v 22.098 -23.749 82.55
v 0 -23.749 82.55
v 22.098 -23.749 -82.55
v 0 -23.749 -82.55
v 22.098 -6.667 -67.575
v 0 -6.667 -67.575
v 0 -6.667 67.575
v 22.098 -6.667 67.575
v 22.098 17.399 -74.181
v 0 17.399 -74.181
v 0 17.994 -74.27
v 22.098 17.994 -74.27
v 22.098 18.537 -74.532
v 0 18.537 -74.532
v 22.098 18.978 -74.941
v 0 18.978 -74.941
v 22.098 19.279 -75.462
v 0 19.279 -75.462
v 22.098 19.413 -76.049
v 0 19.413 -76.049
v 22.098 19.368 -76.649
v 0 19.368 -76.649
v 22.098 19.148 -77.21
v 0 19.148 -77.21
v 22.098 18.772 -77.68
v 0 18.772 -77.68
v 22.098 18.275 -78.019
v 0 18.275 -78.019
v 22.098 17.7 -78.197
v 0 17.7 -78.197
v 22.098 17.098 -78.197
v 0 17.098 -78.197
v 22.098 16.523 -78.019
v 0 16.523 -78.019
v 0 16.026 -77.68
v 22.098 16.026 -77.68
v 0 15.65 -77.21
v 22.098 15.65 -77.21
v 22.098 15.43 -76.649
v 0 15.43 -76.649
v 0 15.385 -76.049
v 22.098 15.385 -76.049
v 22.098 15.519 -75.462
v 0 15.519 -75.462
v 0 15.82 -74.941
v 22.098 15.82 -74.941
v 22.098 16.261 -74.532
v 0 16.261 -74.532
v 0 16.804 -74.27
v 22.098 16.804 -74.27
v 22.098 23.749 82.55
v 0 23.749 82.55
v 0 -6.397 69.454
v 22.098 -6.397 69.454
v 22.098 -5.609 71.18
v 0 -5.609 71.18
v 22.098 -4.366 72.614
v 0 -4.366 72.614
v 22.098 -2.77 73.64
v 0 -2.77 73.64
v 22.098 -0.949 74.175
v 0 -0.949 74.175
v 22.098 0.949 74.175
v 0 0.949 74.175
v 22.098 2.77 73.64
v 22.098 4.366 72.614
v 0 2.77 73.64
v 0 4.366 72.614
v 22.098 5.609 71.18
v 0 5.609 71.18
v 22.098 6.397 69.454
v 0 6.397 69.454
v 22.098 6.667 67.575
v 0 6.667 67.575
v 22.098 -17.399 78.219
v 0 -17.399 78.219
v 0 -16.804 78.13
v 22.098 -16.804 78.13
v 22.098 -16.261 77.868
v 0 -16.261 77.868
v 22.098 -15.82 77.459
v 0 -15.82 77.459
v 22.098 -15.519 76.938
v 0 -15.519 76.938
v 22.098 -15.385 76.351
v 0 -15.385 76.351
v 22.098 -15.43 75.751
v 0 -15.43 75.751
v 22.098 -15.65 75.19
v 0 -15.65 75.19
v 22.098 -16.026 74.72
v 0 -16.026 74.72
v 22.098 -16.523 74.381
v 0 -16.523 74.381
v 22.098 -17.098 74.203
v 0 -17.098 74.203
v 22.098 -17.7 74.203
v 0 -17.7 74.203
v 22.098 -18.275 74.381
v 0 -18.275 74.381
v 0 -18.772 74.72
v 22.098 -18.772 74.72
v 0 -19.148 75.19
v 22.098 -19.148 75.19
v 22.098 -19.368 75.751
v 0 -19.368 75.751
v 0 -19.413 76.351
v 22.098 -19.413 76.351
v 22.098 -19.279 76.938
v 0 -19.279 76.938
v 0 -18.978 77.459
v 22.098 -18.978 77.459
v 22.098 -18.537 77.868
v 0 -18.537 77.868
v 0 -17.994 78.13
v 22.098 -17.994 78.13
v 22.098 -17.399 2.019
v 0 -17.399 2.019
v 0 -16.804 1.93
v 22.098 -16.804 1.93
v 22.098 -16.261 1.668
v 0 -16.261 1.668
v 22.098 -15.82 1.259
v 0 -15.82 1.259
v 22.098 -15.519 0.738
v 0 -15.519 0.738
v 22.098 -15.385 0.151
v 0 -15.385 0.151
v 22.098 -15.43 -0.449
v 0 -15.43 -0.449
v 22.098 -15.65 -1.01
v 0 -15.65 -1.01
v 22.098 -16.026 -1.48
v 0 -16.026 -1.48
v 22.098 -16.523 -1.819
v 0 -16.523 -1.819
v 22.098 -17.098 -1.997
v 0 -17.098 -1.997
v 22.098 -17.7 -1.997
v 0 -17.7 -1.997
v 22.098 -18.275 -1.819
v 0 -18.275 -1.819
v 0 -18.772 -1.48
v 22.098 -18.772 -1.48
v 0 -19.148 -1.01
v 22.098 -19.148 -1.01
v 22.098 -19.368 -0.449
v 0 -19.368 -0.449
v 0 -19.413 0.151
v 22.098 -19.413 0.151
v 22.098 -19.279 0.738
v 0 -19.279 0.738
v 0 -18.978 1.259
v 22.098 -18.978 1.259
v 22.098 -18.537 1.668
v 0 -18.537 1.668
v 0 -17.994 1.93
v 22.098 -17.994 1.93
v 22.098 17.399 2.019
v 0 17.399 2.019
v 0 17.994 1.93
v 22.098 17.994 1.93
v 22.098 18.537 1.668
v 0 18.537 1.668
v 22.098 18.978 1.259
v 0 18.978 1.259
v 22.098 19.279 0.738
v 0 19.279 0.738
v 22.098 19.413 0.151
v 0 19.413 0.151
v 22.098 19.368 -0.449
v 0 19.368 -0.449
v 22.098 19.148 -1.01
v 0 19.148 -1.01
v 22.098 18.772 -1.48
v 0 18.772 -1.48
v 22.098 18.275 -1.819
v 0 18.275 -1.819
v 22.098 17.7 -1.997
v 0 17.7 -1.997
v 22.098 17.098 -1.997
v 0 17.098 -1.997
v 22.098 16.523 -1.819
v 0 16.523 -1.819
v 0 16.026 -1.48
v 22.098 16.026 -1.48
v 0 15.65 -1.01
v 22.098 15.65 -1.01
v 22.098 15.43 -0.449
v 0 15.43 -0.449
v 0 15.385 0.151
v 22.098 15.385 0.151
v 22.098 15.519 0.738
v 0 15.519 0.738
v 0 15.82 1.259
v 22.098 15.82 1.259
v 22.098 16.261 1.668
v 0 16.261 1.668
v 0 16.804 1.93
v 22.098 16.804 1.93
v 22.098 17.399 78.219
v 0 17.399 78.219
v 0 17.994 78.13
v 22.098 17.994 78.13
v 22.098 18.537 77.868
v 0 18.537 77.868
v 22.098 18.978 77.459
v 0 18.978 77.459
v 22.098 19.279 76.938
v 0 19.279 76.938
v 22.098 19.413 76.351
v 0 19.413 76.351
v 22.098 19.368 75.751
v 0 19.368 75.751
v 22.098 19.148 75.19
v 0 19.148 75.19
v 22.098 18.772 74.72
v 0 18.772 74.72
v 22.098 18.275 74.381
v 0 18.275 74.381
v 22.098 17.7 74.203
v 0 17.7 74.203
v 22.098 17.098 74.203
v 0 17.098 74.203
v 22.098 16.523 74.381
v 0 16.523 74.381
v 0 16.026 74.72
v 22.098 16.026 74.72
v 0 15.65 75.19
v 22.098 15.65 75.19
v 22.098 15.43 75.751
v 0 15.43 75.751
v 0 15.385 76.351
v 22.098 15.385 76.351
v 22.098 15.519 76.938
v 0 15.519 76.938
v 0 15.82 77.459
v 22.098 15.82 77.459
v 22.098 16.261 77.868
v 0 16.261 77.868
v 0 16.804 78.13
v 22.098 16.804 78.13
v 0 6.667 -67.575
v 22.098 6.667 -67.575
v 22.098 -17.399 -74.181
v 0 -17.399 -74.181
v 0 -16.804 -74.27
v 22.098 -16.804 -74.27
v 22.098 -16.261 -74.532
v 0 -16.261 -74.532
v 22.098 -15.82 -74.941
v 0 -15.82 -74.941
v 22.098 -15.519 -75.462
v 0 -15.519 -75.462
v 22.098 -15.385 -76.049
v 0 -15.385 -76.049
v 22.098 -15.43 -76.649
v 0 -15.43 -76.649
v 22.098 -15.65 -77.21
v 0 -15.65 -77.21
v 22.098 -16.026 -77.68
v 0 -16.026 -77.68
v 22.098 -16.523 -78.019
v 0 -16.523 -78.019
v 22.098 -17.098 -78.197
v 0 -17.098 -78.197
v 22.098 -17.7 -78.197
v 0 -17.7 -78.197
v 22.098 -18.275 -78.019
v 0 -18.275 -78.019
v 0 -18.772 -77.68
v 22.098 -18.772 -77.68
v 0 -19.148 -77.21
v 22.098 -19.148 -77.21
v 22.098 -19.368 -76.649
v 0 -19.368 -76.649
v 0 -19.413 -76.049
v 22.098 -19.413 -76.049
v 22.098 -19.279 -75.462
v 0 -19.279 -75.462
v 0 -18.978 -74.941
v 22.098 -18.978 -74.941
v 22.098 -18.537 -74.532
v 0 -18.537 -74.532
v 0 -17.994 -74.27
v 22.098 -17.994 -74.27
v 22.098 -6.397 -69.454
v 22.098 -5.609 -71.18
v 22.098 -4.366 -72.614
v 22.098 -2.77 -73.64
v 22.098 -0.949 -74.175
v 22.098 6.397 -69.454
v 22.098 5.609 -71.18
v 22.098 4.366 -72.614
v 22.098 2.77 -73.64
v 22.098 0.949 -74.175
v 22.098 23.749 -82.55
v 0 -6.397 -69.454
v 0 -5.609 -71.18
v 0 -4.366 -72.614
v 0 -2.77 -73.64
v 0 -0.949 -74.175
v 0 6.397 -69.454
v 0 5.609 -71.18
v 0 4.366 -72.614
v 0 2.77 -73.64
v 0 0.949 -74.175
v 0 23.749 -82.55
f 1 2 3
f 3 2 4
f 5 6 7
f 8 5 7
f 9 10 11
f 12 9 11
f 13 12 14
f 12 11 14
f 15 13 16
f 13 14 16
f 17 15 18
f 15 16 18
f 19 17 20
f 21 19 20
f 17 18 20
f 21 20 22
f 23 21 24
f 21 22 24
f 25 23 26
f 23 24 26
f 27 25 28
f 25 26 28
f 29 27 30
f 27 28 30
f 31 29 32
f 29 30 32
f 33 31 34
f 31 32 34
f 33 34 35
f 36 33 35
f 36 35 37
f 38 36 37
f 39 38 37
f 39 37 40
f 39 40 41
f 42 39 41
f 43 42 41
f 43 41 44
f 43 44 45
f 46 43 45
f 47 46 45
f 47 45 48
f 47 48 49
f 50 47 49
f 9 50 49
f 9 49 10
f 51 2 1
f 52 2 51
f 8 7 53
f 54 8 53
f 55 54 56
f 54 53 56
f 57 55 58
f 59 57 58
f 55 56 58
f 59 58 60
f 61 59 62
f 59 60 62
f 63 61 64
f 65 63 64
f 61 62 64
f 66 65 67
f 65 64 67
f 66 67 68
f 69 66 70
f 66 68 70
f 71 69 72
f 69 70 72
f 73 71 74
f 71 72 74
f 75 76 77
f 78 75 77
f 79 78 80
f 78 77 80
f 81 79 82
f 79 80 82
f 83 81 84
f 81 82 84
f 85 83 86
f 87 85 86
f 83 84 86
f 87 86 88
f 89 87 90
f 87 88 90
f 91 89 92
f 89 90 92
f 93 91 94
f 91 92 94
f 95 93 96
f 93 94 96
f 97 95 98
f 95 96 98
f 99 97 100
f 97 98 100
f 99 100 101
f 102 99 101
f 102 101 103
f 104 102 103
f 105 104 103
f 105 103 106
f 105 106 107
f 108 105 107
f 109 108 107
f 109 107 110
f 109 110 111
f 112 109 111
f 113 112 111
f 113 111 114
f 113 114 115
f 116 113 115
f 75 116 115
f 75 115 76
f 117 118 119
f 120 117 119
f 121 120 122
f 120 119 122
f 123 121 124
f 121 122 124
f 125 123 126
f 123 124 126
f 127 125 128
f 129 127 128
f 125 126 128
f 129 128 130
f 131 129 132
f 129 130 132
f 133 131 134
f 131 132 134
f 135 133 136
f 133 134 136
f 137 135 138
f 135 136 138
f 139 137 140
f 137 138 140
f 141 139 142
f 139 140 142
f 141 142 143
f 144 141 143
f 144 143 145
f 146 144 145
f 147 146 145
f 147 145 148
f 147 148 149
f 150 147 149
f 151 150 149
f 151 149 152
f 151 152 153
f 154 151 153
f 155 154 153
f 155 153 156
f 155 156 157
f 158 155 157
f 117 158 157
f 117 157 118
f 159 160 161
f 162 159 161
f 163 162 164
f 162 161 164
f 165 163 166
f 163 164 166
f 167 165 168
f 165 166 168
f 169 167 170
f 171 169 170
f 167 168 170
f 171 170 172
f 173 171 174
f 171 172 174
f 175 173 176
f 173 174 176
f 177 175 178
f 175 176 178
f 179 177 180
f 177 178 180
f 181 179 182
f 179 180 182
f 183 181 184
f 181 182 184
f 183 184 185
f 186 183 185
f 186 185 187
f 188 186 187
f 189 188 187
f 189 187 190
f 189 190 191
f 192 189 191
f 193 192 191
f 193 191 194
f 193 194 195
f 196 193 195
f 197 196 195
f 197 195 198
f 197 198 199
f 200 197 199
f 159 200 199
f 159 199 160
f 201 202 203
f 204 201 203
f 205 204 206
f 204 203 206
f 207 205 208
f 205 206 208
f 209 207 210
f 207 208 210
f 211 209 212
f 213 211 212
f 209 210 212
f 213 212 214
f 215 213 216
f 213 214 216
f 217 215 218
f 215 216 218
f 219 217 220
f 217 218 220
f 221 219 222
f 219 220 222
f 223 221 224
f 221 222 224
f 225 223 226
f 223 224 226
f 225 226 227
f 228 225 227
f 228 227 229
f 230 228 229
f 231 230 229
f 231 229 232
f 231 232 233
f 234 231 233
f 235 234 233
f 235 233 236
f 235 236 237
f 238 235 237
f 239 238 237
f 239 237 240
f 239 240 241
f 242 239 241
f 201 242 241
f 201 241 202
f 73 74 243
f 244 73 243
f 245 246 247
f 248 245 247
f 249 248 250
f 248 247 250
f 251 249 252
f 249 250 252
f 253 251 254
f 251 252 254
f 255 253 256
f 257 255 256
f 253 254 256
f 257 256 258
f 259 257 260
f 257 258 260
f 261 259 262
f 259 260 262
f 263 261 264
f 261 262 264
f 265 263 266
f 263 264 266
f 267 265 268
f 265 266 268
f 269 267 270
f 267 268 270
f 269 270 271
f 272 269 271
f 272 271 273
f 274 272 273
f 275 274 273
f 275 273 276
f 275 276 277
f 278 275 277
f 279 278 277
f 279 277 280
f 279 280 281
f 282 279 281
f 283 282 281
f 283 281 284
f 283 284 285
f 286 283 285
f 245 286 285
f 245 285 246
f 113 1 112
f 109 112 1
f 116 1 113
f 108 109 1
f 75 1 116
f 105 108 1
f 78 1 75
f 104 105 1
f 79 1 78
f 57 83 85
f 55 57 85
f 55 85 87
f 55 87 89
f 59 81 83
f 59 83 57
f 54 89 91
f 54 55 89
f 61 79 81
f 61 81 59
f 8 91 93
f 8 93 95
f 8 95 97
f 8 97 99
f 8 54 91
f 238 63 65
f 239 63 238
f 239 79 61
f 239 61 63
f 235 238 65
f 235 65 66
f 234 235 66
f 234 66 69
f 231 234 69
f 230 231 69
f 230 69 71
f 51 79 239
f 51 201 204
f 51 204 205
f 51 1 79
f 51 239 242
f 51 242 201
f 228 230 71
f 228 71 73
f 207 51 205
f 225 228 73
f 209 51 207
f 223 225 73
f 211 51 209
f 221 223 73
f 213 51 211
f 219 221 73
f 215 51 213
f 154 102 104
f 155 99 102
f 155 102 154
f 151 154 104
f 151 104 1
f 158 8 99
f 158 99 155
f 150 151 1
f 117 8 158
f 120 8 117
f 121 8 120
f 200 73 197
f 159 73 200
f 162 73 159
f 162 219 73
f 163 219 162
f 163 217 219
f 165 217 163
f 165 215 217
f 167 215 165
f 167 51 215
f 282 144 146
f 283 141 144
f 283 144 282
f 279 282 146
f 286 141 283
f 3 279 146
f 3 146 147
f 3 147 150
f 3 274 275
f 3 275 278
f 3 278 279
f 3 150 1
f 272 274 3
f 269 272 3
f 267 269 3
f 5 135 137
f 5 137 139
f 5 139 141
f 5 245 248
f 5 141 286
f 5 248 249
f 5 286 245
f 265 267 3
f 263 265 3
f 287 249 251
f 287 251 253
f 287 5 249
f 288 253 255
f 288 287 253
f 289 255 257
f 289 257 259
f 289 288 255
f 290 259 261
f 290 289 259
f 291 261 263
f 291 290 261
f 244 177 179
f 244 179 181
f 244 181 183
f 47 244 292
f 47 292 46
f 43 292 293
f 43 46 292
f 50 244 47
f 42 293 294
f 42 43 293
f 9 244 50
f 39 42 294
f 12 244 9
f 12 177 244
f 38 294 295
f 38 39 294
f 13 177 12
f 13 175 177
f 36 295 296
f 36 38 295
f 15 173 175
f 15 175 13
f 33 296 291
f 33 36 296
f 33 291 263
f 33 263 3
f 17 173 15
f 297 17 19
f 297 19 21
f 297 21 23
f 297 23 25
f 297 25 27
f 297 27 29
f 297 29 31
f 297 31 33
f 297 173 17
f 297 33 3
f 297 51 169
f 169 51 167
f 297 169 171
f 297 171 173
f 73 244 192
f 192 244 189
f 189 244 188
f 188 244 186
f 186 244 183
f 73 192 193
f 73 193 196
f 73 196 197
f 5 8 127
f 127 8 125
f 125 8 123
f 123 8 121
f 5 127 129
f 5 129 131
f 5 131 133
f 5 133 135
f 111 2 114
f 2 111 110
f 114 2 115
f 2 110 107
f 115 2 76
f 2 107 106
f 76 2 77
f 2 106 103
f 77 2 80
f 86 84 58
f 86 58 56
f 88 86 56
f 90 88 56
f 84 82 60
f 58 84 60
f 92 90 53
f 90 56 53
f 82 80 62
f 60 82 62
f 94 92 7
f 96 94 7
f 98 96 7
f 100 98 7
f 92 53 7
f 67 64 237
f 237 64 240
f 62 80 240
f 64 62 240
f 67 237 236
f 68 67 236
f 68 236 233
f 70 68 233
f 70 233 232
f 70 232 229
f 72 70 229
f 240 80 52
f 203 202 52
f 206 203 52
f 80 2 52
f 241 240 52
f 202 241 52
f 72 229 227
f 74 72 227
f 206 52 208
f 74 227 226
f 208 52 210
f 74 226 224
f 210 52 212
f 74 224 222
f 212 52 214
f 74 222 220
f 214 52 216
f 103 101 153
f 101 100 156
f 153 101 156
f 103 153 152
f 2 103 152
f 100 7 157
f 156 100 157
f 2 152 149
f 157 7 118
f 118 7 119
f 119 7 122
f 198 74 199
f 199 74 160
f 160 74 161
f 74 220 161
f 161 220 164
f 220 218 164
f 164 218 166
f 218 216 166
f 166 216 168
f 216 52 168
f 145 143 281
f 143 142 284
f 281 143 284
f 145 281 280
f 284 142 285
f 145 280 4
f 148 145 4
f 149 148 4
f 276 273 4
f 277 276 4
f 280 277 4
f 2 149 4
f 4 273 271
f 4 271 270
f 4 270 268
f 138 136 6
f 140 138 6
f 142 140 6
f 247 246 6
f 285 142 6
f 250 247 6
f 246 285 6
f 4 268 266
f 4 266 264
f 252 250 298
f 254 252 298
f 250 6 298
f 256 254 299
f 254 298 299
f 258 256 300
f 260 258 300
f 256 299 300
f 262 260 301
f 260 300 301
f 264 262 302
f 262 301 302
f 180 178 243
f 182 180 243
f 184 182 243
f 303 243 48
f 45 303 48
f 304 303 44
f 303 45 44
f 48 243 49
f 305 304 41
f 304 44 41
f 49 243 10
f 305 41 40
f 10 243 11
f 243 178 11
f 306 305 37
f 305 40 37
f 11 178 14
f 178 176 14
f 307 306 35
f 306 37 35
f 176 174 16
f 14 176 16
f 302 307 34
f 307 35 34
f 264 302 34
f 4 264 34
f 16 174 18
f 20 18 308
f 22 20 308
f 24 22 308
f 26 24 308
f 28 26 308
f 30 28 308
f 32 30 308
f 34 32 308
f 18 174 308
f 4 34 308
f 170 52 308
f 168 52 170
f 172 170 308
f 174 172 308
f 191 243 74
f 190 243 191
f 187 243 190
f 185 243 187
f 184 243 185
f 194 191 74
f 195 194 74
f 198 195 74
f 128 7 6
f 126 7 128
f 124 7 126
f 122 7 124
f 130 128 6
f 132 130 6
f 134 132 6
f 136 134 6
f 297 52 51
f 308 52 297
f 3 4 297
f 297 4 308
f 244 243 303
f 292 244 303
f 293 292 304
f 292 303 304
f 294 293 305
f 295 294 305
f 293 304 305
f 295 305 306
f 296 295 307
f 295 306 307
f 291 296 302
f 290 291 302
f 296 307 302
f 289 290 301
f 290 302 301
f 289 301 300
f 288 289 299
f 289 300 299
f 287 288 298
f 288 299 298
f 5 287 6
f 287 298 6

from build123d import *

# Parameters (mm, degrees)
SKETCH1_W              = 165.1
SKETCH1_H              = 47.498
BOSS_EXTRUDE1_DEPTH    = 22.098
F_10_32_TAPPED_HOLE1_D = 4.0386


with BuildPart() as part:
    # Sketch1 → Boss-Extrude1 (new body)
    with BuildSketch(Plane(origin=(0, 0, 0), x_dir=(0, 0, -1), z_dir=(1, 0, 0))):
        Rectangle(SKETCH1_W, SKETCH1_H)
        with BuildLine():
            Line((-67.5752522, 6.6675), (67.5752522, 6.6675))
            ThreePointArc((67.5752522, 6.6675), (74.2427522, 0), (67.5752522, -6.6675))
            Line((67.5752522, -6.6675), (-67.5752522, -6.6675))
            ThreePointArc((-67.5752522, -6.6675), (-74.2427522, 0), (-67.5752522, 6.6675))
        make_face(mode=Mode.SUBTRACT)
    extrude(amount=BOSS_EXTRUDE1_DEPTH)

    # #10-32 Tapped Hole1 (through all)
    with Locations(Plane(origin=(22.098, 0, 0), x_dir=(0, 0, -1), z_dir=(1, 0, 0))):
        with Locations((-76.2, 17.399), (-76.2, -17.399), (0, -17.399), (76.2, -17.399), (76.2, 17.399), (0, 17.399)):
            Hole(F_10_32_TAPPED_HOLE1_D / 2)


solid = part.part
